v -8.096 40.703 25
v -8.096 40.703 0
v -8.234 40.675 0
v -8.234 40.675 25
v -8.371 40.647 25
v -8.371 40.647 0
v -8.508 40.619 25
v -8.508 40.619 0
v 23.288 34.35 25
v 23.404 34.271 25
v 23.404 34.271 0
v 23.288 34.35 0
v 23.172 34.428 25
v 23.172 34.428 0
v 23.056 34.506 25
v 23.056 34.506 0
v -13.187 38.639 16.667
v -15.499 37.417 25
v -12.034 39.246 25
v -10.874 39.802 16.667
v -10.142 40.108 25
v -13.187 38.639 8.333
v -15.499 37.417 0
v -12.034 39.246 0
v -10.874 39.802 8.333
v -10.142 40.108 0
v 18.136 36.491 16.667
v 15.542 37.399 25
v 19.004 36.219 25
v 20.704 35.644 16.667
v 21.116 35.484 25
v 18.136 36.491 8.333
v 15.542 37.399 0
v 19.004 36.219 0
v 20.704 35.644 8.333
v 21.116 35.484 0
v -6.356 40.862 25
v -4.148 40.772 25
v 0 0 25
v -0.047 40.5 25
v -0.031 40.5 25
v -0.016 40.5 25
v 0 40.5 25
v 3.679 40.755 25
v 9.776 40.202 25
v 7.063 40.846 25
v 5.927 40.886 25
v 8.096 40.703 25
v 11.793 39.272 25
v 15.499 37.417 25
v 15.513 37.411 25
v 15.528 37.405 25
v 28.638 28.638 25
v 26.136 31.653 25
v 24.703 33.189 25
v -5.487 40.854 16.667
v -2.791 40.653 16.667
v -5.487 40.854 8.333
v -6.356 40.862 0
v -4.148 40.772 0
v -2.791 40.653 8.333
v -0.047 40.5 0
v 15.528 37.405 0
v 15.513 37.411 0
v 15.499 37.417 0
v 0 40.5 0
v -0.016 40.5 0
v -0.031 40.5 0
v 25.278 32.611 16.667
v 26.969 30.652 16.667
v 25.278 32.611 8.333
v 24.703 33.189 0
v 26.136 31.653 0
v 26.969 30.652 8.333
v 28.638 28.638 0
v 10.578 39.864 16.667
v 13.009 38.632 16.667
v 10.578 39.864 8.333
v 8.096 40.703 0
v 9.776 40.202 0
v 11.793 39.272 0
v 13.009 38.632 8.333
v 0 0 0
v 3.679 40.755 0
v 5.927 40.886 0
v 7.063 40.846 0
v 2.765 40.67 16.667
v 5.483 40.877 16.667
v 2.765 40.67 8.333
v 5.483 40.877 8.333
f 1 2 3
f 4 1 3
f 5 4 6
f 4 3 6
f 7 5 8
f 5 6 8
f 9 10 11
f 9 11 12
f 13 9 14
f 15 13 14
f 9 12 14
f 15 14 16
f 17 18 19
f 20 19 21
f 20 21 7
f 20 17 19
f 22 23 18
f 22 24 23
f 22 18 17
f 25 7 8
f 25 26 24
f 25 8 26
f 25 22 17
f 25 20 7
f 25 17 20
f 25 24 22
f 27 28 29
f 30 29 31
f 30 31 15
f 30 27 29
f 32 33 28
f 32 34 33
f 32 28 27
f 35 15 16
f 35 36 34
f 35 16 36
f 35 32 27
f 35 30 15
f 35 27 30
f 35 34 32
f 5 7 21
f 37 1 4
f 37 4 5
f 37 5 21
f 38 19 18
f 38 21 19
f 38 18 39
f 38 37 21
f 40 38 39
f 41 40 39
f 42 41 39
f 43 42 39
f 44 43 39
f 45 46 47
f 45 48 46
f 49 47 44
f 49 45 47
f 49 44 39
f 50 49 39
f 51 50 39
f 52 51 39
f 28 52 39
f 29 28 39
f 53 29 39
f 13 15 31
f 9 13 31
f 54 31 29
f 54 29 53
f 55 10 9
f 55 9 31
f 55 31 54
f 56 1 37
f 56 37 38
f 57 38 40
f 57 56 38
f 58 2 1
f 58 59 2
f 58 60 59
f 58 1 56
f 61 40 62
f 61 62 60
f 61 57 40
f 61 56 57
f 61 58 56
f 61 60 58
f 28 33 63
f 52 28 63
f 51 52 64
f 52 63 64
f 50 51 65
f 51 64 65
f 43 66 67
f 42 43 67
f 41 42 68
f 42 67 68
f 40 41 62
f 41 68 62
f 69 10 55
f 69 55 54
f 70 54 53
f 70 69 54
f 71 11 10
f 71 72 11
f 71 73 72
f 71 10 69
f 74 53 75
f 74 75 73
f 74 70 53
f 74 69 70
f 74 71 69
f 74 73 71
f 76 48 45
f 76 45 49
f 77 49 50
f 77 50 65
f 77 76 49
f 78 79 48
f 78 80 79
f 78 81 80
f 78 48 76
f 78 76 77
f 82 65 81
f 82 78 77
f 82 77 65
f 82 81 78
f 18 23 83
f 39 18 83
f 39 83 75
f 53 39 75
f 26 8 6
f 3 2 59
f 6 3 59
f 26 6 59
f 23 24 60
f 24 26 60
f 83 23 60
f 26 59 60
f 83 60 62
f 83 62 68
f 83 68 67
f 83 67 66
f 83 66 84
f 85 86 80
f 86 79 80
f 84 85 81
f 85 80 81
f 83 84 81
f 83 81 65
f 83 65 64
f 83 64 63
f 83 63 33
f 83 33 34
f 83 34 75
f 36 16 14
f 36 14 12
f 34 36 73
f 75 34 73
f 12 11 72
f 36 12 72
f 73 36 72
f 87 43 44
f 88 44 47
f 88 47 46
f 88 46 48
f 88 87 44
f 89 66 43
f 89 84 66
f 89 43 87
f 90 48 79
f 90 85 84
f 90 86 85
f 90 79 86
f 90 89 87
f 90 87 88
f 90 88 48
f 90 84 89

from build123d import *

# Parameters (mm, degrees)
F1_DEPTH = 25


# Not quite as in the source:
# - ends of sketch curves that miss each other by under 0.0002 mm in the source are joined


with BuildPart() as f1:
    # F0 (on Top) → F1 (new body)
    with BuildSketch(Plane.XY):
        with BuildLine():
            Line((-7.9011580417, 39.7218038563), (0, 0))
            Line((0, 0), (0, 40.5))
            ThreePointArc((0, 40.5), (-0.0234209669, 40.4999932279), (-0.046841926, 40.4999729115))
            ThreePointArc((-0.046841926, 40.4999729115), (-3.9930017081, 40.3026790345), (-7.9011580417, 39.7218038563))
        make_face()
        with BuildLine():
            Line((-15.4986790108, 37.4171210667), (0, 0))
            Line((0, 0), (-7.9011580417, 39.7218038563))
            ThreePointArc((-7.9011580417, 39.7218038563), (-11.7565294288, 38.7560835972), (-15.4986790108, 37.4171210667))
        make_face()
        with BuildLine():
            Line((22.5005944373, 33.6745192983), (0, 0))
            Line((0, 0), (28.6378246381, 28.6378246381))
            ThreePointArc((28.6378246381, 28.6378246381), (25.6929280086, 31.3069233612), (22.5005944373, 33.6745192983))
        make_face()
        with BuildLine():
            Line((15.4986790108, 37.4171210667), (0, 0))
            Line((0, 0), (22.5005944373, 33.6745192983))
            ThreePointArc((22.5005944373, 33.6745192983), (19.1122200978, 35.7067646663), (15.5419449411, 37.3991704112))
            ThreePointArc((15.5419449411, 37.3991704112), (15.5203145712, 37.4081519941), (15.4986790108, 37.4171210667))
        make_face()
        with BuildLine():
            Line((7.9011580417, 39.7218038563), (0, 0))
            Line((0, 0), (15.4986790108, 37.4171210667))
            ThreePointArc((15.4986790108, 37.4171210667), (11.7565294288, 38.7560835972), (7.9011580417, 39.7218038563))
        make_face()
        with BuildLine():
            Line((0, 40.5), (0, 0))
            Line((0, 0), (7.9011580417, 39.7218038563))
            ThreePointArc((7.9011580417, 39.7218038563), (3.9696941833, 40.3049814302), (0, 40.5))
        make_face()
        with BuildLine():
            add(Edge.make_bspline(
                [(0, 40.5), (2.7706806954, 40.5108669818), (5.5531529278, 41.2084422704), (8.0962483637, 40.7025891367)],
                knots=[0.375, 0.375, 0.375, 0.375, 0.5, 0.5, 0.5, 0.5], degree=3))
            ThreePointArc((0, 40.5), (3.9696941833, 40.3049814302), (7.9011580417, 39.7218038563))
            Line((7.9011580417, 39.7218038563), (8.0962483637, 40.7025891367))
        make_face()
        with BuildLine():
            ThreePointArc((-15.4986790108, 37.4171210667), (-11.7565294288, 38.7560835972), (-7.9011580417, 39.7218038563))
            Line((-7.9011580417, 39.7218038563), (-8.0962483637, 40.7025891367))
            ThreePointArc((-8.0962483637, 40.7025891367), (-8.3021528679, 40.6610902185), (-8.5078446962, 40.6185496864))
            add(Edge.make_bspline(
                [(-15.4986790108, 37.4171210667), (-13.169476805, 38.5739896459), (-10.9180232176, 40.0695028236), (-8.5078446962, 40.6185496864)],
                knots=[0.125, 0.125, 0.125, 0.125, 0.2432920147, 0.2432920147, 0.2432920147, 0.2432920147], degree=3))
        make_face()
        with BuildLine():
            Line((-8.0962483637, 40.7025891367), (-7.9011580417, 39.7218038563))
            ThreePointArc((-7.9011580417, 39.7218038563), (-3.9930017081, 40.3026790345), (-0.046841926, 40.4999729115))
            add(Edge.make_bspline(
                [(-8.0962483637, 40.7025891367), (-5.5440345136, 41.1623685455), (-2.801770338, 40.4967143515), (-0.046841926, 40.4999729115)],
                knots=[0.25, 0.25, 0.25, 0.25, 0.3742955555, 0.3742955555, 0.3742955555, 0.3742955555], degree=3))
        make_face()
        with BuildLine():
            ThreePointArc((22.5005944373, 33.6745192983), (25.6929280086, 31.3069233612), (28.6378246381, 28.6378246381))
            add(Edge.make_bspline(
                [(23.4042695923, 34.2708354852), (25.4208730599, 32.841246937), (26.9286368317, 30.597978935), (28.6378246381, 28.6378246381)],
                knots=[0.7567079853, 0.7567079853, 0.7567079853, 0.7567079853, 0.875, 0.875, 0.875, 0.875], degree=3))
            ThreePointArc((23.4042695923, 34.2708354852), (23.230514679, 34.388852667), (23.0561646703, 34.5059889106))
            Line((23.0561646703, 34.5059889106), (22.5005944373, 33.6745192983))
        make_face()
        with BuildLine():
            ThreePointArc((15.5419449411, 37.3991704112), (19.1122200978, 35.7067646663), (22.5005944373, 33.6745192983))
            Line((22.5005944373, 33.6745192983), (23.0561646703, 34.5059889106))
            add(Edge.make_bspline(
                [(15.5419449411, 37.3991704112), (18.0859199176, 36.3418944337), (20.8741764939, 35.907459652), (23.0561646703, 34.5059889106)],
                knots=[0.6257044445, 0.6257044445, 0.6257044445, 0.6257044445, 0.75, 0.75, 0.75, 0.75], degree=3))
        make_face()
        with BuildLine():
            ThreePointArc((7.9011580417, 39.7218038563), (11.7565294288, 38.7560835972), (15.4986790108, 37.4171210667))
            add(Edge.make_bspline(
                [(8.0962483637, 40.7025891367), (10.6393437996, 40.1967360031), (12.9430624391, 38.4874544473), (15.4986790108, 37.4171210667)],
                knots=[0.5, 0.5, 0.5, 0.5, 0.625, 0.625, 0.625, 0.625], degree=3))
            Line((8.0962483637, 40.7025891367), (7.9011580417, 39.7218038563))
        make_face()
    extrude(amount=F1_DEPTH)


solid = f1.part
